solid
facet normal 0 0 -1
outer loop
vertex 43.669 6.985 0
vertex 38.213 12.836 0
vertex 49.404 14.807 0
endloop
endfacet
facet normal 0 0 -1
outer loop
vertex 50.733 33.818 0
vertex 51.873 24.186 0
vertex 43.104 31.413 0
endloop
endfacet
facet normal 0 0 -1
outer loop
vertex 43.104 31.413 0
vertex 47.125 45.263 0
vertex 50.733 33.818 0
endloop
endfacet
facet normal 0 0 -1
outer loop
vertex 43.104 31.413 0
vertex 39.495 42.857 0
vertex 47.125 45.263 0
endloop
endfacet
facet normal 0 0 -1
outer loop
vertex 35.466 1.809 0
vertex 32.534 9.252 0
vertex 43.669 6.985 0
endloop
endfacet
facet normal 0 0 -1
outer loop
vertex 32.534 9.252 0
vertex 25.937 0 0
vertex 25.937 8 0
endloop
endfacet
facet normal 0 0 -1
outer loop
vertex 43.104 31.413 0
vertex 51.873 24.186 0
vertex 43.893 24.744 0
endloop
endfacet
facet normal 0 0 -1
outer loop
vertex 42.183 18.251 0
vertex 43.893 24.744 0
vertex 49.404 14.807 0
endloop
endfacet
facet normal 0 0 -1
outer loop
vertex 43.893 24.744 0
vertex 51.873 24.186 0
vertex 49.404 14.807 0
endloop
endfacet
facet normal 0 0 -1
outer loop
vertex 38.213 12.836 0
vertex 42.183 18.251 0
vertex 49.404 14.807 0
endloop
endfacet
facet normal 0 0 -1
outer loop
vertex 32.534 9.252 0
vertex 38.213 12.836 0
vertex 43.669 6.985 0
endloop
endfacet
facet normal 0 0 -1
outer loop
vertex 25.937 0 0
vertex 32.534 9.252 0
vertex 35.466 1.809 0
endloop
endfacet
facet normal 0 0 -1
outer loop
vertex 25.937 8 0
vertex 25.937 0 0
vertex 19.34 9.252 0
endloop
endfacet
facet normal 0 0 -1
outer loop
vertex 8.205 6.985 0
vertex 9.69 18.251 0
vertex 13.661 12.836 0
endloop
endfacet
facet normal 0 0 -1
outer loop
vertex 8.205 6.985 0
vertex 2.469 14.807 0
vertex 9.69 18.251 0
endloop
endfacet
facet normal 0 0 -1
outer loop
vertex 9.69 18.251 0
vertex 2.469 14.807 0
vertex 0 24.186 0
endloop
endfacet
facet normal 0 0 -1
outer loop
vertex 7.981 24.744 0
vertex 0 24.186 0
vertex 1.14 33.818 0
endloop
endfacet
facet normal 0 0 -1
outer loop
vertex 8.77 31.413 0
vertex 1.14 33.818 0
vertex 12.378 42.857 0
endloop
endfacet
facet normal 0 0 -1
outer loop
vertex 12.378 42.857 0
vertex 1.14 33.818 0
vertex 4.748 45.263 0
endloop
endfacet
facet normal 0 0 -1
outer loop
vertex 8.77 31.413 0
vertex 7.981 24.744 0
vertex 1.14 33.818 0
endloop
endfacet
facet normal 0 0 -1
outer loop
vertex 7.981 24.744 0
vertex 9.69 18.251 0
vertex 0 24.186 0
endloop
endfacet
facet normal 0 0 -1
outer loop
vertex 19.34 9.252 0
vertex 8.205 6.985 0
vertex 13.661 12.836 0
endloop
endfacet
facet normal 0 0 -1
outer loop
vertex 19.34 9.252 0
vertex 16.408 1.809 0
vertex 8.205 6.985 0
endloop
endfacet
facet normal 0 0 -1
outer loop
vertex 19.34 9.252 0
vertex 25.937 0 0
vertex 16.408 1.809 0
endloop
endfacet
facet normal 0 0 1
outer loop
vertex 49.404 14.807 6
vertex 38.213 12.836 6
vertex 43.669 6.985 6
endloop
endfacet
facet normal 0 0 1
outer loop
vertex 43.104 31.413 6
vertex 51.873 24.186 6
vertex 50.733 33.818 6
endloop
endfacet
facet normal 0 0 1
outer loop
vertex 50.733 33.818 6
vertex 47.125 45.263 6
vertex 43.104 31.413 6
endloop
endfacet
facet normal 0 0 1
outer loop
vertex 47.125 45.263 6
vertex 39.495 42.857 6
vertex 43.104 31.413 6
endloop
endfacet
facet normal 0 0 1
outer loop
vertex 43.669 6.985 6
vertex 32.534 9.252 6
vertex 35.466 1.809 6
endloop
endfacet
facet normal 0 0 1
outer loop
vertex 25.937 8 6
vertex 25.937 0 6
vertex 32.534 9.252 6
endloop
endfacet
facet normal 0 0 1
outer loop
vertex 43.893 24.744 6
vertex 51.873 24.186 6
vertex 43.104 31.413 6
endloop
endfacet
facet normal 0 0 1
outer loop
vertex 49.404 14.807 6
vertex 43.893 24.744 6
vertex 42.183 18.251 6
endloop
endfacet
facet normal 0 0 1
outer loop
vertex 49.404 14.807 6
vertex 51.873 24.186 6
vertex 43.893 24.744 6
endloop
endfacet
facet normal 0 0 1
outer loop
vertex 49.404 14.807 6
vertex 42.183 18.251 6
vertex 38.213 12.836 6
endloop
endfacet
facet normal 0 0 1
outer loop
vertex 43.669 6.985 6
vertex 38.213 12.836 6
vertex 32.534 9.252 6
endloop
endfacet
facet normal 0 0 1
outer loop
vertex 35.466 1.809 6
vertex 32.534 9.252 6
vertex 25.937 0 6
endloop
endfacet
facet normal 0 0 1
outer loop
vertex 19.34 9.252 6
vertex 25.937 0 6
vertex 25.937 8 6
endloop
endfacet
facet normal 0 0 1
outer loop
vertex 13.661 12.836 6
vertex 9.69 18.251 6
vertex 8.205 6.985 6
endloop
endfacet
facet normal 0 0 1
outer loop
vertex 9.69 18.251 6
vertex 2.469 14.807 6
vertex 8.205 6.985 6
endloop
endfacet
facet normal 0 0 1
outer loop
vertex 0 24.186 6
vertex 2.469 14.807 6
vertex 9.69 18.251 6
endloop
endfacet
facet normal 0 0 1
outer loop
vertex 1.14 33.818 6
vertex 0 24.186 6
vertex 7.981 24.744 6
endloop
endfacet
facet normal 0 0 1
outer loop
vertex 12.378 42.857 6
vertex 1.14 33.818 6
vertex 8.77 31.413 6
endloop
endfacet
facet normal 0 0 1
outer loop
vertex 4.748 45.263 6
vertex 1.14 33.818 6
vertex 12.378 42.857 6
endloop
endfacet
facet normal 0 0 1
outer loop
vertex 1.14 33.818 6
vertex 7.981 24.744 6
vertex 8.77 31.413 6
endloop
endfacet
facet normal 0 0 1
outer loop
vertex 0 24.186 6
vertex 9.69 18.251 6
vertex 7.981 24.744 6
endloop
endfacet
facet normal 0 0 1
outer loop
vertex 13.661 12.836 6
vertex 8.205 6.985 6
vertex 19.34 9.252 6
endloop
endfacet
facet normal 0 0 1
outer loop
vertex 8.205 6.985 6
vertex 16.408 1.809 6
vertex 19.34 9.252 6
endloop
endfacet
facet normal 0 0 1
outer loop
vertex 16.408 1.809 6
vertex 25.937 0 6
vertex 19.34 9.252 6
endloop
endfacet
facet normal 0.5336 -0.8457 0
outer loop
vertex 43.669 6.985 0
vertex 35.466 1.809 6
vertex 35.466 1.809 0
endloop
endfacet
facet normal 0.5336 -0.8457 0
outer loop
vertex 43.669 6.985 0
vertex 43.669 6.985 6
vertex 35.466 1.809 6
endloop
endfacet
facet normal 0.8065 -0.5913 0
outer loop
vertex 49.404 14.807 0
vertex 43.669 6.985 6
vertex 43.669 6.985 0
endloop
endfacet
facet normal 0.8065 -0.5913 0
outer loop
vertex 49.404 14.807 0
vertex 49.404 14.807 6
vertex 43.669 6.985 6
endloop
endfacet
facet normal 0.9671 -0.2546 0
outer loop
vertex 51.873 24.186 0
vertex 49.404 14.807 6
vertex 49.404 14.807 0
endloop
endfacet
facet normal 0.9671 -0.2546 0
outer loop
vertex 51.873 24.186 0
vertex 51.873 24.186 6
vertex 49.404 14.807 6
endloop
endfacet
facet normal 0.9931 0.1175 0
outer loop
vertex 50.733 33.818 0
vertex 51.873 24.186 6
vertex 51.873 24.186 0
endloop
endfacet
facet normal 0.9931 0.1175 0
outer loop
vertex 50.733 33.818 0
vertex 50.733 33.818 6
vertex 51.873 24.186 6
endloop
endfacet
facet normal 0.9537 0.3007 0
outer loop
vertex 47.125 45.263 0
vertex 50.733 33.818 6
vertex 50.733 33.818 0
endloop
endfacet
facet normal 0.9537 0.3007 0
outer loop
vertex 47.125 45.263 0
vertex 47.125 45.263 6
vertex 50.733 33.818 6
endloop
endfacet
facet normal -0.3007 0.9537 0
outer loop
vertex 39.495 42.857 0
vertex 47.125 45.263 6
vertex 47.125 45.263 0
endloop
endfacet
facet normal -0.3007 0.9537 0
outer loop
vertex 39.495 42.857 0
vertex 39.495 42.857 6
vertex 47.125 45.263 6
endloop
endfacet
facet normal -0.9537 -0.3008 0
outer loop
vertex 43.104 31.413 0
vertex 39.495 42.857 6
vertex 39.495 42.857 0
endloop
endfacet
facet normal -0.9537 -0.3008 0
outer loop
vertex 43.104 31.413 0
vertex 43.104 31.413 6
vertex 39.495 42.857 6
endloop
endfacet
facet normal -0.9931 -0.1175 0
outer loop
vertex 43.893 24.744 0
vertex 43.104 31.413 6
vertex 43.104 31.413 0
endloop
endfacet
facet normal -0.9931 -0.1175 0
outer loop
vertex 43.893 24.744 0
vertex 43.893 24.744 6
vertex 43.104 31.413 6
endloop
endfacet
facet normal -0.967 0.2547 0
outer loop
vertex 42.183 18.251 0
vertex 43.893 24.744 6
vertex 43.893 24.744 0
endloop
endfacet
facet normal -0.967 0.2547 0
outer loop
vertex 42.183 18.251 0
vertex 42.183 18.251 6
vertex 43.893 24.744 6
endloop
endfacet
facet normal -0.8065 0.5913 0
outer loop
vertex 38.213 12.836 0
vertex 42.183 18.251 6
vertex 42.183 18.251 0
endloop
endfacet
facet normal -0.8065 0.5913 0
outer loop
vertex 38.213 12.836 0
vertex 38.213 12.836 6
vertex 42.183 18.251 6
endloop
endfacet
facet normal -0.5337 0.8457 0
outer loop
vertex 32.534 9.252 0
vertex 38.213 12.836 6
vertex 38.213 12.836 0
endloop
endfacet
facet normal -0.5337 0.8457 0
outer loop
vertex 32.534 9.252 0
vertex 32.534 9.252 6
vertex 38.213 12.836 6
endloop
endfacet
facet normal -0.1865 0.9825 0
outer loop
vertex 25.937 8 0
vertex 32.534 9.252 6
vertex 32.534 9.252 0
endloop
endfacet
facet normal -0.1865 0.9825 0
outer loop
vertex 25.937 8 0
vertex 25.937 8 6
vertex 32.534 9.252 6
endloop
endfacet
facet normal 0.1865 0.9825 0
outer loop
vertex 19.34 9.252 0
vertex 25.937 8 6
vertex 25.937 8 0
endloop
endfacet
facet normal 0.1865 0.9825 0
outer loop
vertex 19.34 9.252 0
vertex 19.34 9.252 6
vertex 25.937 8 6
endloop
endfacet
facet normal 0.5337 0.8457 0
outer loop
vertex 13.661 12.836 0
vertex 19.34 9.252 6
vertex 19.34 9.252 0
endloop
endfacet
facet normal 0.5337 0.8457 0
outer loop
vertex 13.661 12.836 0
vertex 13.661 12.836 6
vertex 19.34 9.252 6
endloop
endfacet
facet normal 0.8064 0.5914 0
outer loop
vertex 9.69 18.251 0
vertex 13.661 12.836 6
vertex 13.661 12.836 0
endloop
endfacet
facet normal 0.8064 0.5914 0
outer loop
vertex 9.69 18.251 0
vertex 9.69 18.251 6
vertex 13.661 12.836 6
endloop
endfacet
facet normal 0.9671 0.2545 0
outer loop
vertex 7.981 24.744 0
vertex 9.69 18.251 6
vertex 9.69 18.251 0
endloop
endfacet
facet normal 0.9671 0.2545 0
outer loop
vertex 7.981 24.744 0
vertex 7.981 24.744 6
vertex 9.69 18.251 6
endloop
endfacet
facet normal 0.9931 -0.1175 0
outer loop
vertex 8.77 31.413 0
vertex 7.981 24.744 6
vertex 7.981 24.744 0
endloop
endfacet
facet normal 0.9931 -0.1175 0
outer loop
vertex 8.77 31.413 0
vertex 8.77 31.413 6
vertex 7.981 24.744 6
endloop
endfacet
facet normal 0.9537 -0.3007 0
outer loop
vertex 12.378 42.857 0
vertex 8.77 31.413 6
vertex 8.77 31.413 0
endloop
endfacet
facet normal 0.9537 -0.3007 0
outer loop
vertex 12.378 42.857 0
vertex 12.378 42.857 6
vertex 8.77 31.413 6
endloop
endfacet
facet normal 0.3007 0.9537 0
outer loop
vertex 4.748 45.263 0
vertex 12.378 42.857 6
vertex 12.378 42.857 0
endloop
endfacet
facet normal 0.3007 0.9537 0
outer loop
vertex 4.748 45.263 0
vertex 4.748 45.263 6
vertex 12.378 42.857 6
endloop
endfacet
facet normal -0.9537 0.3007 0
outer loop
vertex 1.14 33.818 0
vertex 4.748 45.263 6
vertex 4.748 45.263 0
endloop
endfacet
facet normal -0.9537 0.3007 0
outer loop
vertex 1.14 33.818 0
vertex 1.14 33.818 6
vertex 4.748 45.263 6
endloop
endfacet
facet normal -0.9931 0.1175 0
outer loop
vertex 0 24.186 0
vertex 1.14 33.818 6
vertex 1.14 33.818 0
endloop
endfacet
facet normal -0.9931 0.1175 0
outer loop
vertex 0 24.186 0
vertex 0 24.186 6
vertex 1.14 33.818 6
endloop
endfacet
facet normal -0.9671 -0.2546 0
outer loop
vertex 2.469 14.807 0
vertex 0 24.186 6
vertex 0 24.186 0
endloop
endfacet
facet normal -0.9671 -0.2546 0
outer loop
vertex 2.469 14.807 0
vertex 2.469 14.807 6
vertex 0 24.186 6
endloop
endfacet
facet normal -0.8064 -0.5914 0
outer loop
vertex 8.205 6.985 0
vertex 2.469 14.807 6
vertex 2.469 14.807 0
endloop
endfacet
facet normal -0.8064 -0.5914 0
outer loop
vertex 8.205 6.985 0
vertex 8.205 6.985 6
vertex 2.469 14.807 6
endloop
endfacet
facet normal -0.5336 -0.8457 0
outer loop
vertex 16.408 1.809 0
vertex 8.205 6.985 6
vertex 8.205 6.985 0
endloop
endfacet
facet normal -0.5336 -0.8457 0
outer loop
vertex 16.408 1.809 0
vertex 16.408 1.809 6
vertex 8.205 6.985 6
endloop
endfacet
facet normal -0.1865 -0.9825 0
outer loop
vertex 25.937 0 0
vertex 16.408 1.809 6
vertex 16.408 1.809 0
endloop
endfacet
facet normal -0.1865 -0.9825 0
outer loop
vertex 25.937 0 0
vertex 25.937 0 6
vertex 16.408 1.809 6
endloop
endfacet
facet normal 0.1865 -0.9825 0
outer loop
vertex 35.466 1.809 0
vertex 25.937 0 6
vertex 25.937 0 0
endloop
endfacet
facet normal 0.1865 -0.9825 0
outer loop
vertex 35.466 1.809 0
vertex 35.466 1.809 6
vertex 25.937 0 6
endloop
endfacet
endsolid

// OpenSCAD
$fn = 32;

// ----------------------------------------------------------------------
// Clip blank: omega clip, 6 mm thick
// ----------------------------------------------------------------------

// --- parameters (mm) ---
profile_height = 6;       // extrusion height
profile_points = 26;      // points of the closed outline

profile = [[1.14, 33.818], [0, 24.186], [2.469, 14.807], [8.205, 6.985], [16.408, 1.809], [25.937, 0], [35.466, 1.809], [43.669, 6.985], [49.404, 14.807], [51.873, 24.186], [50.733, 33.818], [47.125, 45.263], [39.495, 42.857], [43.104, 31.413], [43.893, 24.744], [42.183, 18.251], [38.213, 12.836], [32.534, 9.252], [25.937, 8], [19.34, 9.252], [13.661, 12.836], [9.69, 18.251], [7.981, 24.744], [8.77, 31.413], [12.378, 42.857], [4.748, 45.263]];  // single closed polygon, 26 points, counter clockwise

// --- the one profile operation ---
linear_extrude(height = profile_height) polygon(points = profile);
